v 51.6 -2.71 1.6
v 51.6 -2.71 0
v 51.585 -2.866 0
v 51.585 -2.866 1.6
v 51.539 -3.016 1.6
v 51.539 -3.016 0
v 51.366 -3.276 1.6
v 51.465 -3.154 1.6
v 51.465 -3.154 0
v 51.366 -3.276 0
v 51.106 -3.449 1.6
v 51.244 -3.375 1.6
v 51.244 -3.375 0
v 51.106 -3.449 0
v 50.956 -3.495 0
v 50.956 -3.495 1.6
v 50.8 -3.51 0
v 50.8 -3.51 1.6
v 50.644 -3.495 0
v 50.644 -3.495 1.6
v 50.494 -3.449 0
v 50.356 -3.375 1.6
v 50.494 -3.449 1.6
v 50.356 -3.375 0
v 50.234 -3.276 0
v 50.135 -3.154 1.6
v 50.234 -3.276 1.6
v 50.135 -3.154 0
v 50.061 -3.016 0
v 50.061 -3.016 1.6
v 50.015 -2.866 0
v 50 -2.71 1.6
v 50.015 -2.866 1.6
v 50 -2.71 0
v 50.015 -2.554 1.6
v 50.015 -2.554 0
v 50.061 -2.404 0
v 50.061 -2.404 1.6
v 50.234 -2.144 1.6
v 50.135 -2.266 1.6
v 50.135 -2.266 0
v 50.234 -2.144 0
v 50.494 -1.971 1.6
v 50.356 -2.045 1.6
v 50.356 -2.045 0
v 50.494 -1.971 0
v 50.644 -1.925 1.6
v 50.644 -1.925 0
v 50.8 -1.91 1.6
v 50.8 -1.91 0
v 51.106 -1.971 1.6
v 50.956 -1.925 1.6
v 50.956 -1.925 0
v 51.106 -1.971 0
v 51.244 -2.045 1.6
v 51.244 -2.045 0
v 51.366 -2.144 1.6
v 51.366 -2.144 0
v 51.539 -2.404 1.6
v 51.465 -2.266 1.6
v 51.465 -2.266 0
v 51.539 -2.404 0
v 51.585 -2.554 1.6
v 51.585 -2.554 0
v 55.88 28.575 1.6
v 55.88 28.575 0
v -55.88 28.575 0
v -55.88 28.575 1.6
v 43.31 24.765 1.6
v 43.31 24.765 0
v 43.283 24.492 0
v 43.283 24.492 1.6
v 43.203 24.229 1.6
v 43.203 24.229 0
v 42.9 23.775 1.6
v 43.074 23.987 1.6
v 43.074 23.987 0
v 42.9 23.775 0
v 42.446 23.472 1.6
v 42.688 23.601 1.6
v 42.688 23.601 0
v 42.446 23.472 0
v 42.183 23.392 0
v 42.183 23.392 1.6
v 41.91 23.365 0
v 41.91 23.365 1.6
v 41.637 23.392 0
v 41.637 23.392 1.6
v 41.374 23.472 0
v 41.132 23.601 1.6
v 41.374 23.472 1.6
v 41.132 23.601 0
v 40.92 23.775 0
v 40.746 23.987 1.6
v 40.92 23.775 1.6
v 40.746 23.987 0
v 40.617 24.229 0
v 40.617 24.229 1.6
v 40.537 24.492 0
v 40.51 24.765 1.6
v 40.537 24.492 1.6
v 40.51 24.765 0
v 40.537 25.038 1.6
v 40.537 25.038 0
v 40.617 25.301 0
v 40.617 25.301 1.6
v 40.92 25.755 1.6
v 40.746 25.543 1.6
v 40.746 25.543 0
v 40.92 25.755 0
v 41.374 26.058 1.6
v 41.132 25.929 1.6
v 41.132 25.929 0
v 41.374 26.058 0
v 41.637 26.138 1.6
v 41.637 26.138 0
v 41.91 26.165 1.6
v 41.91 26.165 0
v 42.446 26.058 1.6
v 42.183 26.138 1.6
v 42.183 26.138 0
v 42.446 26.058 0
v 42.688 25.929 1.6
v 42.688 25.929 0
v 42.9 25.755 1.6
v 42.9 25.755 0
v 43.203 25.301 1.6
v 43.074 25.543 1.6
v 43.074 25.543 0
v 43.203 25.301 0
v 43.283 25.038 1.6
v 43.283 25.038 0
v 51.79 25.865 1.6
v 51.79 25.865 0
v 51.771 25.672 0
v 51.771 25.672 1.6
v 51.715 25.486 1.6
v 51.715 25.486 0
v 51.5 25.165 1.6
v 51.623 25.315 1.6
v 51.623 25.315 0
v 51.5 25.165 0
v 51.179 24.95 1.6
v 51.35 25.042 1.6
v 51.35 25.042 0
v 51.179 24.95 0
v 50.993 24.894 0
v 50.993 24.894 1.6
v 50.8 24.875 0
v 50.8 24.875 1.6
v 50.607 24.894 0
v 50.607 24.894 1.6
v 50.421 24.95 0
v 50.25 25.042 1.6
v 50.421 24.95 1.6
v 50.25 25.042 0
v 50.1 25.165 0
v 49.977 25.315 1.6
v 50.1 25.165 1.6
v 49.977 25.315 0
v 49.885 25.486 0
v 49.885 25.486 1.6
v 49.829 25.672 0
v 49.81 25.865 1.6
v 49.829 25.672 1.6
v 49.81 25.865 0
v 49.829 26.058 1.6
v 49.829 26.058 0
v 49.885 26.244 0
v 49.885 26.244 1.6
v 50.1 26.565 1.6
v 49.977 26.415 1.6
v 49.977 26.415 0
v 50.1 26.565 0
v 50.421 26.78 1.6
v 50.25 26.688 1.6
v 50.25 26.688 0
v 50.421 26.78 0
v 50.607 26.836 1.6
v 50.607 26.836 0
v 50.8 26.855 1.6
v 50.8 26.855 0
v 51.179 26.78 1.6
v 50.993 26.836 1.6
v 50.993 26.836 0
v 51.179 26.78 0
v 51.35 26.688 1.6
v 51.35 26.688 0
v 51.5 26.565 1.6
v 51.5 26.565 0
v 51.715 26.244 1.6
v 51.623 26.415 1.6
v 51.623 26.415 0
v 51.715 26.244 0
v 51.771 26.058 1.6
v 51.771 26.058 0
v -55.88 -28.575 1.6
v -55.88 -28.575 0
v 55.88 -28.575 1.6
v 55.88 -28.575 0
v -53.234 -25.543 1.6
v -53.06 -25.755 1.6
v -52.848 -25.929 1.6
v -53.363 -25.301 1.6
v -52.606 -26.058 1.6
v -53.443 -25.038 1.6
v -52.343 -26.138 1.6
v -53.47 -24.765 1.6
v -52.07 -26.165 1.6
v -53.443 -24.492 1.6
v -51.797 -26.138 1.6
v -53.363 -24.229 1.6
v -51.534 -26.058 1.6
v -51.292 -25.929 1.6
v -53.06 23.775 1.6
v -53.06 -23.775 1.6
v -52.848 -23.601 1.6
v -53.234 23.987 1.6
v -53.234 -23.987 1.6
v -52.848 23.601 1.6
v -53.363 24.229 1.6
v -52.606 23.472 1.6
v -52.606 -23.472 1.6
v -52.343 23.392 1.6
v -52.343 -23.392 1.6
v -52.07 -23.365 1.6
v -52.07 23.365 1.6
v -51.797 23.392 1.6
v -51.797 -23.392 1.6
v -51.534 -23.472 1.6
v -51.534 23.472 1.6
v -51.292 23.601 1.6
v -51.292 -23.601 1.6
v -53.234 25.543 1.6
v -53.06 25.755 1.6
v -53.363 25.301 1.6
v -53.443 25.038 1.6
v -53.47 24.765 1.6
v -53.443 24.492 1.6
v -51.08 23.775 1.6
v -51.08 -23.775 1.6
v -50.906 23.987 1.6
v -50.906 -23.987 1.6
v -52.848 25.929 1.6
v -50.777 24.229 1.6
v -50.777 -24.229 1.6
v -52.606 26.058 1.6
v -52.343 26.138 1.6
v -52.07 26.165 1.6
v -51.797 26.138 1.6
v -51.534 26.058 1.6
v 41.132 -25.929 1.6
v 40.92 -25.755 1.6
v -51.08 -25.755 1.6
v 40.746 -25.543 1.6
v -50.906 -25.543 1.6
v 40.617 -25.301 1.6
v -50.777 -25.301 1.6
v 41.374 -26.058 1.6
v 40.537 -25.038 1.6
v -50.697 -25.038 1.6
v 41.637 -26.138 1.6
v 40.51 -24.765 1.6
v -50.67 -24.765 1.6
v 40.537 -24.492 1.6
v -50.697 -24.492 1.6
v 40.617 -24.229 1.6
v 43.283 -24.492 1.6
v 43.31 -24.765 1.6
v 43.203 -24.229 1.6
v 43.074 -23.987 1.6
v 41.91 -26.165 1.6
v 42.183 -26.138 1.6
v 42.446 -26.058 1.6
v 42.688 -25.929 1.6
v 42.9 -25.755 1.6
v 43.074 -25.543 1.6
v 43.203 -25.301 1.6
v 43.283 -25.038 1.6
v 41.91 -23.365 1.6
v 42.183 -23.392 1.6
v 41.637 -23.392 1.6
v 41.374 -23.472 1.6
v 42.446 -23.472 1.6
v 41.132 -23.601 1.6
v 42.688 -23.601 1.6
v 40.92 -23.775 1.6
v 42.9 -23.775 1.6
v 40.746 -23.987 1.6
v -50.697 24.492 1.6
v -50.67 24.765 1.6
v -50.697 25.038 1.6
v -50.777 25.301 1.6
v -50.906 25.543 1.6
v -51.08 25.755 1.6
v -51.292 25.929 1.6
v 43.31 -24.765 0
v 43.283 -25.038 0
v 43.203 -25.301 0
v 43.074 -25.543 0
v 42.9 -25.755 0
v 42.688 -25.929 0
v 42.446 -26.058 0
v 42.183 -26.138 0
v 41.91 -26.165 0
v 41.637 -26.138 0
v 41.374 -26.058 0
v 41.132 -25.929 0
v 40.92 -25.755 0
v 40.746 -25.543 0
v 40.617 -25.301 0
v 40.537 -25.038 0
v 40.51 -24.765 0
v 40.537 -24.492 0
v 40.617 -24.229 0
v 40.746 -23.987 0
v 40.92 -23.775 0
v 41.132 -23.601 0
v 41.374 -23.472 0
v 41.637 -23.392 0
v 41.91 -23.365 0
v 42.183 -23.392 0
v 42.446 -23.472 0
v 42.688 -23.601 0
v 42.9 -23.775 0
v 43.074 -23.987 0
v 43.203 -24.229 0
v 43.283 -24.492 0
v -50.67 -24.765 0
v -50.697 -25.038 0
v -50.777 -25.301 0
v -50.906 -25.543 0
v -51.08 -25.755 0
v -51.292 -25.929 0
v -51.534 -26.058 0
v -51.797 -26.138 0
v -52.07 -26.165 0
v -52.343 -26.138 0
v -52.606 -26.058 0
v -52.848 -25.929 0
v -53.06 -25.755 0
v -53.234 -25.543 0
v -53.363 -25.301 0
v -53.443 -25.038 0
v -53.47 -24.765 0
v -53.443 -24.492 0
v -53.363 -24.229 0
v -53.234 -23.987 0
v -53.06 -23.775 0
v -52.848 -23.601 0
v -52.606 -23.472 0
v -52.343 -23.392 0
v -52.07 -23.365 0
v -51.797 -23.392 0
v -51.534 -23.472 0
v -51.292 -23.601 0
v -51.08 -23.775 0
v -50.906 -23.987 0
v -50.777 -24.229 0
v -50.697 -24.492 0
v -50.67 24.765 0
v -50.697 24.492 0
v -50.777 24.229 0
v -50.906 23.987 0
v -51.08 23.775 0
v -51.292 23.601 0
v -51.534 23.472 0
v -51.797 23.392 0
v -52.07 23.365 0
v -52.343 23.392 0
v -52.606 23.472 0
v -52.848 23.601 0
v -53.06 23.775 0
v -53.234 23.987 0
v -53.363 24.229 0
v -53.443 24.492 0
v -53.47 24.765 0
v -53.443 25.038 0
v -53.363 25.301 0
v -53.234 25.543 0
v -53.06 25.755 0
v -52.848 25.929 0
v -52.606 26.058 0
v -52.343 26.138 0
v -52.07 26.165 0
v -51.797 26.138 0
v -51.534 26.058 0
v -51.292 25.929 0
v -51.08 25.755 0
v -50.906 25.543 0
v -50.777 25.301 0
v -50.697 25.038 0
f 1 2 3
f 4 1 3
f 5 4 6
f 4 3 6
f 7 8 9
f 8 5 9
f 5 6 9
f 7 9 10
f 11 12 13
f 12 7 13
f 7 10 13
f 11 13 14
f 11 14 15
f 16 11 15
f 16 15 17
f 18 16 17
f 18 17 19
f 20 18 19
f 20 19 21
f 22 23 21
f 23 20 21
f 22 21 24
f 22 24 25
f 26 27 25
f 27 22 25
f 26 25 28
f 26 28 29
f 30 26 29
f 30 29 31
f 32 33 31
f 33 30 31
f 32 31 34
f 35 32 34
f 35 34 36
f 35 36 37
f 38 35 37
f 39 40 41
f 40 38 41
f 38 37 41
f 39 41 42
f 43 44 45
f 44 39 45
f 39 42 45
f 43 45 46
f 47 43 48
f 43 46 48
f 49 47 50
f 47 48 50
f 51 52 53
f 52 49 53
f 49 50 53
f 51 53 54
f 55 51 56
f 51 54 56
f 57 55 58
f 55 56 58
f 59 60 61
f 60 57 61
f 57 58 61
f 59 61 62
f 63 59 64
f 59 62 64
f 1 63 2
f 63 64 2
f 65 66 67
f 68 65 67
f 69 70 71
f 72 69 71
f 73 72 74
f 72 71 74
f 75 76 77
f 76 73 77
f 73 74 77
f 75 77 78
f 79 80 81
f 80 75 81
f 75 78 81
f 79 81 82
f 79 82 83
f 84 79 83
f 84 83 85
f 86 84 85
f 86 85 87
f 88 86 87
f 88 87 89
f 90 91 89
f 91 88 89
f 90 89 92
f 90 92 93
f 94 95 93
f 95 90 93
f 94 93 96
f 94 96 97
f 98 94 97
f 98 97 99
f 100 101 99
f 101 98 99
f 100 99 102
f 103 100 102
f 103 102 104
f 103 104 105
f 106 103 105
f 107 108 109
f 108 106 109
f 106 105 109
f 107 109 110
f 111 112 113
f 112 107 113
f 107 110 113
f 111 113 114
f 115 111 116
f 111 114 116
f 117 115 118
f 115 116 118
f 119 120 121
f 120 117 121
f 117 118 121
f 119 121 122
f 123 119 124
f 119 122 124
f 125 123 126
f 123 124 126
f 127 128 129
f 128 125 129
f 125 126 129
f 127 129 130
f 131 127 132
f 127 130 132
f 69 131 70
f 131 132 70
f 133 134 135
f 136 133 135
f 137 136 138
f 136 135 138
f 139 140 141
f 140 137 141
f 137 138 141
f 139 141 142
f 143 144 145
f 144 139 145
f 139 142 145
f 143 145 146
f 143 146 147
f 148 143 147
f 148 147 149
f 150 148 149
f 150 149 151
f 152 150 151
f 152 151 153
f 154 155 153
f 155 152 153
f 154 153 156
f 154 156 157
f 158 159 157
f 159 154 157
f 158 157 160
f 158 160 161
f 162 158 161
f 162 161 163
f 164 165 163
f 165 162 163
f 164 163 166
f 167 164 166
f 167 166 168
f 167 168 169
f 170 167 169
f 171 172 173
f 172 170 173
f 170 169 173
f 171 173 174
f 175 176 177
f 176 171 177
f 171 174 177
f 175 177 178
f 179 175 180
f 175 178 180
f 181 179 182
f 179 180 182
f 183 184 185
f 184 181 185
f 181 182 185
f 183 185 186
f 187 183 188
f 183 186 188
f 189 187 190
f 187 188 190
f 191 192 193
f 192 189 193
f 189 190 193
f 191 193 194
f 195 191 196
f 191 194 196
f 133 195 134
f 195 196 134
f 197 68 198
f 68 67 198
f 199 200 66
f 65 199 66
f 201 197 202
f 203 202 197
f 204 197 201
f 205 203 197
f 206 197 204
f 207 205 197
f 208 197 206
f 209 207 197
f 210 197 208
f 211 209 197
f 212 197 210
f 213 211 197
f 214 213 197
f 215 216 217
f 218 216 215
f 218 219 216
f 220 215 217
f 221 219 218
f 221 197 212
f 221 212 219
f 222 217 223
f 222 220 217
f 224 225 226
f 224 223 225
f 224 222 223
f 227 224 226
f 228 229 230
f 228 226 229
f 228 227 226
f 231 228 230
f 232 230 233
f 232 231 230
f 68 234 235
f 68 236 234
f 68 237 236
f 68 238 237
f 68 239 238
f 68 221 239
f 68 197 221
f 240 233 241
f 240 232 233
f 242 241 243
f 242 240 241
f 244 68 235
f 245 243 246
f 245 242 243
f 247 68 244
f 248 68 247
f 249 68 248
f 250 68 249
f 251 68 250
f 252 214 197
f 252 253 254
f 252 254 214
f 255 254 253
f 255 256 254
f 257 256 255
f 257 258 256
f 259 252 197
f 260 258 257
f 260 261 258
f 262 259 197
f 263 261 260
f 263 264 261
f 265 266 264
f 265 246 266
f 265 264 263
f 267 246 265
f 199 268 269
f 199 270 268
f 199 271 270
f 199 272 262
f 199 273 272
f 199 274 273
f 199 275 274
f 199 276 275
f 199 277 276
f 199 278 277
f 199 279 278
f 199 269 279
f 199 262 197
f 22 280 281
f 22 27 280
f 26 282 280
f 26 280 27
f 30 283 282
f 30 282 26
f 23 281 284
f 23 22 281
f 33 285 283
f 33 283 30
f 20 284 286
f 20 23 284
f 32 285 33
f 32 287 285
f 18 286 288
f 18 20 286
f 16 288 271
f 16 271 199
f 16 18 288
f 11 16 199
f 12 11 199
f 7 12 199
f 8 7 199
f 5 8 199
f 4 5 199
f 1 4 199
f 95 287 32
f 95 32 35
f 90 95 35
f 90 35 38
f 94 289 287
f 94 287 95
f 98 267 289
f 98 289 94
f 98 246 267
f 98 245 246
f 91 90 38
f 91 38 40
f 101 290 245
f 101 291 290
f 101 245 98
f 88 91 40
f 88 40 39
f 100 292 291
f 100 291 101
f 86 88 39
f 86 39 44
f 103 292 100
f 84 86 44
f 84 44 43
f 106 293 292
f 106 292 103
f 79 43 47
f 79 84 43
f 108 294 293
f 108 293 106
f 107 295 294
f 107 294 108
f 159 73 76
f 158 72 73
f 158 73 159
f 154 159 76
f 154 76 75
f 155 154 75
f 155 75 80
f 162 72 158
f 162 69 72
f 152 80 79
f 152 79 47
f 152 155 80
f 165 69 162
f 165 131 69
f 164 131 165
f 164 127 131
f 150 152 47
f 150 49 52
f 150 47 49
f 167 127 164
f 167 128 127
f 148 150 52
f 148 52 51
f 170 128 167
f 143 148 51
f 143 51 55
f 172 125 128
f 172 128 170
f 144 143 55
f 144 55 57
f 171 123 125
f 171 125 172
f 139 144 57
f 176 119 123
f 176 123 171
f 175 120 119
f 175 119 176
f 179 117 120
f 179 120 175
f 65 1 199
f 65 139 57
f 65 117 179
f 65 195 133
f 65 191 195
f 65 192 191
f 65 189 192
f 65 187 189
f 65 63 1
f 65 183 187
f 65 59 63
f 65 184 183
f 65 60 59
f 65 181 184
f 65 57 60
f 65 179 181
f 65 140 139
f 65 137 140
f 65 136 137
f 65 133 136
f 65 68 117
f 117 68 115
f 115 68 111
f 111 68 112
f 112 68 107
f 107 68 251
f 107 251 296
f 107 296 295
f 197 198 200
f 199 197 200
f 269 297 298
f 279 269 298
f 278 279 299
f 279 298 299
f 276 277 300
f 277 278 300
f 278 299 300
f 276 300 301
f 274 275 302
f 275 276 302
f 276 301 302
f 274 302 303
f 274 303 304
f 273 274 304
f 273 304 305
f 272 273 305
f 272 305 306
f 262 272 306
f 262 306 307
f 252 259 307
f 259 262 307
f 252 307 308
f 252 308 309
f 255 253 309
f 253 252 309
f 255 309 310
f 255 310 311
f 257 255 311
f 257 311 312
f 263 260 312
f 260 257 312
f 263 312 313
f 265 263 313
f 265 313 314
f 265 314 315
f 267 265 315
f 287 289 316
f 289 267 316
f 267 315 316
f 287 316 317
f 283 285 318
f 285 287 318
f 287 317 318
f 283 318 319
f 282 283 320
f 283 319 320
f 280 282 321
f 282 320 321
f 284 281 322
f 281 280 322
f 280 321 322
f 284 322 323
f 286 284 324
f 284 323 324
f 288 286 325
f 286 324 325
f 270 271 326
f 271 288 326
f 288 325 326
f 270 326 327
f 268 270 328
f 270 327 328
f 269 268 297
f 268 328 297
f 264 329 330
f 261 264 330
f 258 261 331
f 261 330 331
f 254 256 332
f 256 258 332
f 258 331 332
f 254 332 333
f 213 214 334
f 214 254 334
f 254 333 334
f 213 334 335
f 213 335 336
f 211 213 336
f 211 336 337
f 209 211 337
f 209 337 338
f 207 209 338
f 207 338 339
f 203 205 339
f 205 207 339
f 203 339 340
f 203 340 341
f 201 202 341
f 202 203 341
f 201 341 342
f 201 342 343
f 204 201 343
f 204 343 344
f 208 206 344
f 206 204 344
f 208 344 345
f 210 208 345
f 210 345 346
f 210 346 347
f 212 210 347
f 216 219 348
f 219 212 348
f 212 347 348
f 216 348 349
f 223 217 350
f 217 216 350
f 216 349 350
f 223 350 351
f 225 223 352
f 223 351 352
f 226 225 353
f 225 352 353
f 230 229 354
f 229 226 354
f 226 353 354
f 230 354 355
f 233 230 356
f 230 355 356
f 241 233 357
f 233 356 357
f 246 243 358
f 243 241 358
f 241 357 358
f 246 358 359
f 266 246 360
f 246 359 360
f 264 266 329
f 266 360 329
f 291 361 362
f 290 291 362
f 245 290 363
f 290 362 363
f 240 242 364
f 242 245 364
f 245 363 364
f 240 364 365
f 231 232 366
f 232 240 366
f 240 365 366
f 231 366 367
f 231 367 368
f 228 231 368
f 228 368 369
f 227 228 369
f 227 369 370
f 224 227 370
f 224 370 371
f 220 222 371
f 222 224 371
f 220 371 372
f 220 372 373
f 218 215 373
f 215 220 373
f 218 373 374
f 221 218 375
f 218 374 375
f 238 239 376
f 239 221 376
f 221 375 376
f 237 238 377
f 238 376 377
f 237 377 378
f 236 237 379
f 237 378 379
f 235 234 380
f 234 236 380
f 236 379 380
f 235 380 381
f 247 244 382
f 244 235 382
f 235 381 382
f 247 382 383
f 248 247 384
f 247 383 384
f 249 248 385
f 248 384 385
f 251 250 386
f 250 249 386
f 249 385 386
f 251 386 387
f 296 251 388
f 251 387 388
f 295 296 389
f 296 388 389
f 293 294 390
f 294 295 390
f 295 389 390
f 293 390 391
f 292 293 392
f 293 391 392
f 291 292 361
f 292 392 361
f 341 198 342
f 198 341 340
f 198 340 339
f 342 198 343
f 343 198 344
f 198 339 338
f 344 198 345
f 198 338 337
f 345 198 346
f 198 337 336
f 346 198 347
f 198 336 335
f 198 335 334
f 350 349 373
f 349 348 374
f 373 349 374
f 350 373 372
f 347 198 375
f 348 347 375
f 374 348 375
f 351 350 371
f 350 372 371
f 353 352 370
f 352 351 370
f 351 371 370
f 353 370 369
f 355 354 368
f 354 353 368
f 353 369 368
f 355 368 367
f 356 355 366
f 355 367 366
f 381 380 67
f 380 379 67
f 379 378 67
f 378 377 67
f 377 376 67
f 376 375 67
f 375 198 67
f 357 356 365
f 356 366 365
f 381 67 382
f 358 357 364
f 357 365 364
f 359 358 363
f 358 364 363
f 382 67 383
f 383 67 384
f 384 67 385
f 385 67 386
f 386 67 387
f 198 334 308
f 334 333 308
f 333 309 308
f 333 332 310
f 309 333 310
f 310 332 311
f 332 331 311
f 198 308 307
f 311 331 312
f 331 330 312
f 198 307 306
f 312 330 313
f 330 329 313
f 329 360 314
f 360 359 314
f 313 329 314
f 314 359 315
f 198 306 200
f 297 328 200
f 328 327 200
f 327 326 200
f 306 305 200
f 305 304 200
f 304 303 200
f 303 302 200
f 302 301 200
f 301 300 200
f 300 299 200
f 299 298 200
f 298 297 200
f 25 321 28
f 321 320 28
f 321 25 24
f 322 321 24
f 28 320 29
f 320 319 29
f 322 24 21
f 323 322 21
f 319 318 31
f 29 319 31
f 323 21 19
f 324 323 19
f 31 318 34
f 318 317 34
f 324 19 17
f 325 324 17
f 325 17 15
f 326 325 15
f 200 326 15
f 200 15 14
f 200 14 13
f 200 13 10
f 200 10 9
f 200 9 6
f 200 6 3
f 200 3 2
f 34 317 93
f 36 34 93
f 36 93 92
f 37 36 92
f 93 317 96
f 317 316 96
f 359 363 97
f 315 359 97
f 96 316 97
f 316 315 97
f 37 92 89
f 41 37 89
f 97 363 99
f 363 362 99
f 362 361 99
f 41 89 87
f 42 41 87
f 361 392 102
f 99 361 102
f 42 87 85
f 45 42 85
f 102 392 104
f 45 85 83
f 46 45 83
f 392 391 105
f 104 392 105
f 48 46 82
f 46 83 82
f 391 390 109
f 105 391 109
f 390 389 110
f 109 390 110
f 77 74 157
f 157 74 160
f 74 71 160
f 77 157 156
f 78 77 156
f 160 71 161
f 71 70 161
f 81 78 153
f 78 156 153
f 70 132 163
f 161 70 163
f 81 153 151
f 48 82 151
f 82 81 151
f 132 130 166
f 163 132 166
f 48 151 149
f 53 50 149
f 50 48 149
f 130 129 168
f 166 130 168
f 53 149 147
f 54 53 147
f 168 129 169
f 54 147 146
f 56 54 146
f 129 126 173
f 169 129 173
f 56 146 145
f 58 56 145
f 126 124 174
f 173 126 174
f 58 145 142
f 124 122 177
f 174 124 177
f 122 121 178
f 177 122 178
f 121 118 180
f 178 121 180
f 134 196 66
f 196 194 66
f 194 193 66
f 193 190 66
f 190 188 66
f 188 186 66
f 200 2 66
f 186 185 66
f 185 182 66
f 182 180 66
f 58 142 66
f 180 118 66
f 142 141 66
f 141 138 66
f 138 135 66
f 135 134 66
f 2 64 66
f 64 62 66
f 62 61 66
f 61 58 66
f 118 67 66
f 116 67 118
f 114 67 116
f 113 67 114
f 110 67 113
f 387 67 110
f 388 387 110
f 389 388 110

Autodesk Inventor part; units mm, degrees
ref_plane "YZ Plane" through (0, 0, 0) normal (1, 0, 0) x (0, 1, 0)
ref_plane "XZ Plane" through (0, 0, 0) normal (0, 1, 0) x (-1, 0, 0)
ref_plane "XY Plane" through (0, 0, 0) normal (0, 0, 1) x (1, 0, 0)
sketch "Sketch1" plane through (0, 0, 0) normal (0, 0, 1) x (1, 0, 0)
  line L0 (-55.88, -28.575) -> (55.88, -28.575)
  line L1 (55.88, -28.575) -> (55.88, 28.575)
  line L2 (55.88, 28.575) -> (-55.88, 28.575)
  line L3 (-55.88, 28.575) -> (-55.88, -28.575)
  line L4 (-55.88, -28.575) -> (55.88, 28.575) construction
  line L5 (55.88, -28.575) -> (-55.88, 28.575) construction
  circle A0 centre (-52.07, 24.765) radius 1.4
  line L6 (-55.88, 0) -> (55.88, 0) construction
  line L7 (0, 28.575) -> (0, -28.575) construction
  circle A1 centre (-52.07, -24.765) radius 1.4
  circle A2 centre (-31.75, 24.765) radius 1.4
  circle A3 centre (31.75, 24.765) radius 1.4
  circle A4 centre (-31.75, -24.765) radius 1.4
  circle A5 centre (31.75, -24.765) radius 1.4
  circle A6 centre (50.8, 25.865) radius 0.99
  circle A7 centre (41.91, 24.765) radius 1.4
  circle A8 centre (41.91, -24.765) radius 1.4
  circle A9 centre (50.8, -2.71) radius 0.8
  point P0 (0, 0)
  dimension "d2" = 111.76
  dimension "d4" = 57.15
  dimension "d5" = 49.53
  dimension "d6" = 2.8
  dimension "d8" = 2.8
  dimension "d10" = 49.53
  dimension "d21" = 3.81
  dimension "d22" = 3.81
  dimension "d23" = 3.81
  dimension "d28" = 3.81
  dimension "d30" = 63.5
  dimension "d35" = 1.98
  dimension "d36" = 5.08
  dimension "d37" = 2.71
  dimension "d38" = 2.8
  dimension "d39" = 3.81
  dimension "d40" = 13.97
  dimension "d41" = 63.5
  dimension "d42" = 1.6
  dimension "d43" = 5.08
  dimension "d44" = 2.71
extrude "Extrusion1" add sketch "Sketch1" along normal blind 1.6 contours L3 L2 L1 L0 | A2 | A3 | A4 | A5
sketch "Sketch3" plane through (0, 0, 1.6) normal (0, 0, 1) x (1, 0, 0)
  circle A0 centre (26.67, -24.765) radius 1.4 projected
  circle A1 centre (-26.67, -24.765) radius 1.4 projected
  line L0 (55.88, 28.575) -> (-55.88, 28.575) projected
  line L1 (-21.67, -25.765) -> (21.67, -25.765)
  line L2 (21.67, -25.765) -> (21.67, 30.575)
  line L3 (21.67, 30.575) -> (-21.67, 30.575)
  line L4 (-21.67, 30.575) -> (-21.67, -25.765)
  line L5 (55.88, -28.575) -> (55.88, 28.575) projected
  line L6 (-55.88, 28.575) -> (-55.88, -28.575) projected
  point P0 (0, 0)
  dimension "d15" = 2
  dimension "d16" = 5
  dimension "d17" = 5
  dimension "d18" = 1
  dimension "d33" = 34.21
  dimension "d34" = 34.21
extrude "Extrusion3" [suppressed]
properties part number "BetaBoard01" material "PCB(1)"
